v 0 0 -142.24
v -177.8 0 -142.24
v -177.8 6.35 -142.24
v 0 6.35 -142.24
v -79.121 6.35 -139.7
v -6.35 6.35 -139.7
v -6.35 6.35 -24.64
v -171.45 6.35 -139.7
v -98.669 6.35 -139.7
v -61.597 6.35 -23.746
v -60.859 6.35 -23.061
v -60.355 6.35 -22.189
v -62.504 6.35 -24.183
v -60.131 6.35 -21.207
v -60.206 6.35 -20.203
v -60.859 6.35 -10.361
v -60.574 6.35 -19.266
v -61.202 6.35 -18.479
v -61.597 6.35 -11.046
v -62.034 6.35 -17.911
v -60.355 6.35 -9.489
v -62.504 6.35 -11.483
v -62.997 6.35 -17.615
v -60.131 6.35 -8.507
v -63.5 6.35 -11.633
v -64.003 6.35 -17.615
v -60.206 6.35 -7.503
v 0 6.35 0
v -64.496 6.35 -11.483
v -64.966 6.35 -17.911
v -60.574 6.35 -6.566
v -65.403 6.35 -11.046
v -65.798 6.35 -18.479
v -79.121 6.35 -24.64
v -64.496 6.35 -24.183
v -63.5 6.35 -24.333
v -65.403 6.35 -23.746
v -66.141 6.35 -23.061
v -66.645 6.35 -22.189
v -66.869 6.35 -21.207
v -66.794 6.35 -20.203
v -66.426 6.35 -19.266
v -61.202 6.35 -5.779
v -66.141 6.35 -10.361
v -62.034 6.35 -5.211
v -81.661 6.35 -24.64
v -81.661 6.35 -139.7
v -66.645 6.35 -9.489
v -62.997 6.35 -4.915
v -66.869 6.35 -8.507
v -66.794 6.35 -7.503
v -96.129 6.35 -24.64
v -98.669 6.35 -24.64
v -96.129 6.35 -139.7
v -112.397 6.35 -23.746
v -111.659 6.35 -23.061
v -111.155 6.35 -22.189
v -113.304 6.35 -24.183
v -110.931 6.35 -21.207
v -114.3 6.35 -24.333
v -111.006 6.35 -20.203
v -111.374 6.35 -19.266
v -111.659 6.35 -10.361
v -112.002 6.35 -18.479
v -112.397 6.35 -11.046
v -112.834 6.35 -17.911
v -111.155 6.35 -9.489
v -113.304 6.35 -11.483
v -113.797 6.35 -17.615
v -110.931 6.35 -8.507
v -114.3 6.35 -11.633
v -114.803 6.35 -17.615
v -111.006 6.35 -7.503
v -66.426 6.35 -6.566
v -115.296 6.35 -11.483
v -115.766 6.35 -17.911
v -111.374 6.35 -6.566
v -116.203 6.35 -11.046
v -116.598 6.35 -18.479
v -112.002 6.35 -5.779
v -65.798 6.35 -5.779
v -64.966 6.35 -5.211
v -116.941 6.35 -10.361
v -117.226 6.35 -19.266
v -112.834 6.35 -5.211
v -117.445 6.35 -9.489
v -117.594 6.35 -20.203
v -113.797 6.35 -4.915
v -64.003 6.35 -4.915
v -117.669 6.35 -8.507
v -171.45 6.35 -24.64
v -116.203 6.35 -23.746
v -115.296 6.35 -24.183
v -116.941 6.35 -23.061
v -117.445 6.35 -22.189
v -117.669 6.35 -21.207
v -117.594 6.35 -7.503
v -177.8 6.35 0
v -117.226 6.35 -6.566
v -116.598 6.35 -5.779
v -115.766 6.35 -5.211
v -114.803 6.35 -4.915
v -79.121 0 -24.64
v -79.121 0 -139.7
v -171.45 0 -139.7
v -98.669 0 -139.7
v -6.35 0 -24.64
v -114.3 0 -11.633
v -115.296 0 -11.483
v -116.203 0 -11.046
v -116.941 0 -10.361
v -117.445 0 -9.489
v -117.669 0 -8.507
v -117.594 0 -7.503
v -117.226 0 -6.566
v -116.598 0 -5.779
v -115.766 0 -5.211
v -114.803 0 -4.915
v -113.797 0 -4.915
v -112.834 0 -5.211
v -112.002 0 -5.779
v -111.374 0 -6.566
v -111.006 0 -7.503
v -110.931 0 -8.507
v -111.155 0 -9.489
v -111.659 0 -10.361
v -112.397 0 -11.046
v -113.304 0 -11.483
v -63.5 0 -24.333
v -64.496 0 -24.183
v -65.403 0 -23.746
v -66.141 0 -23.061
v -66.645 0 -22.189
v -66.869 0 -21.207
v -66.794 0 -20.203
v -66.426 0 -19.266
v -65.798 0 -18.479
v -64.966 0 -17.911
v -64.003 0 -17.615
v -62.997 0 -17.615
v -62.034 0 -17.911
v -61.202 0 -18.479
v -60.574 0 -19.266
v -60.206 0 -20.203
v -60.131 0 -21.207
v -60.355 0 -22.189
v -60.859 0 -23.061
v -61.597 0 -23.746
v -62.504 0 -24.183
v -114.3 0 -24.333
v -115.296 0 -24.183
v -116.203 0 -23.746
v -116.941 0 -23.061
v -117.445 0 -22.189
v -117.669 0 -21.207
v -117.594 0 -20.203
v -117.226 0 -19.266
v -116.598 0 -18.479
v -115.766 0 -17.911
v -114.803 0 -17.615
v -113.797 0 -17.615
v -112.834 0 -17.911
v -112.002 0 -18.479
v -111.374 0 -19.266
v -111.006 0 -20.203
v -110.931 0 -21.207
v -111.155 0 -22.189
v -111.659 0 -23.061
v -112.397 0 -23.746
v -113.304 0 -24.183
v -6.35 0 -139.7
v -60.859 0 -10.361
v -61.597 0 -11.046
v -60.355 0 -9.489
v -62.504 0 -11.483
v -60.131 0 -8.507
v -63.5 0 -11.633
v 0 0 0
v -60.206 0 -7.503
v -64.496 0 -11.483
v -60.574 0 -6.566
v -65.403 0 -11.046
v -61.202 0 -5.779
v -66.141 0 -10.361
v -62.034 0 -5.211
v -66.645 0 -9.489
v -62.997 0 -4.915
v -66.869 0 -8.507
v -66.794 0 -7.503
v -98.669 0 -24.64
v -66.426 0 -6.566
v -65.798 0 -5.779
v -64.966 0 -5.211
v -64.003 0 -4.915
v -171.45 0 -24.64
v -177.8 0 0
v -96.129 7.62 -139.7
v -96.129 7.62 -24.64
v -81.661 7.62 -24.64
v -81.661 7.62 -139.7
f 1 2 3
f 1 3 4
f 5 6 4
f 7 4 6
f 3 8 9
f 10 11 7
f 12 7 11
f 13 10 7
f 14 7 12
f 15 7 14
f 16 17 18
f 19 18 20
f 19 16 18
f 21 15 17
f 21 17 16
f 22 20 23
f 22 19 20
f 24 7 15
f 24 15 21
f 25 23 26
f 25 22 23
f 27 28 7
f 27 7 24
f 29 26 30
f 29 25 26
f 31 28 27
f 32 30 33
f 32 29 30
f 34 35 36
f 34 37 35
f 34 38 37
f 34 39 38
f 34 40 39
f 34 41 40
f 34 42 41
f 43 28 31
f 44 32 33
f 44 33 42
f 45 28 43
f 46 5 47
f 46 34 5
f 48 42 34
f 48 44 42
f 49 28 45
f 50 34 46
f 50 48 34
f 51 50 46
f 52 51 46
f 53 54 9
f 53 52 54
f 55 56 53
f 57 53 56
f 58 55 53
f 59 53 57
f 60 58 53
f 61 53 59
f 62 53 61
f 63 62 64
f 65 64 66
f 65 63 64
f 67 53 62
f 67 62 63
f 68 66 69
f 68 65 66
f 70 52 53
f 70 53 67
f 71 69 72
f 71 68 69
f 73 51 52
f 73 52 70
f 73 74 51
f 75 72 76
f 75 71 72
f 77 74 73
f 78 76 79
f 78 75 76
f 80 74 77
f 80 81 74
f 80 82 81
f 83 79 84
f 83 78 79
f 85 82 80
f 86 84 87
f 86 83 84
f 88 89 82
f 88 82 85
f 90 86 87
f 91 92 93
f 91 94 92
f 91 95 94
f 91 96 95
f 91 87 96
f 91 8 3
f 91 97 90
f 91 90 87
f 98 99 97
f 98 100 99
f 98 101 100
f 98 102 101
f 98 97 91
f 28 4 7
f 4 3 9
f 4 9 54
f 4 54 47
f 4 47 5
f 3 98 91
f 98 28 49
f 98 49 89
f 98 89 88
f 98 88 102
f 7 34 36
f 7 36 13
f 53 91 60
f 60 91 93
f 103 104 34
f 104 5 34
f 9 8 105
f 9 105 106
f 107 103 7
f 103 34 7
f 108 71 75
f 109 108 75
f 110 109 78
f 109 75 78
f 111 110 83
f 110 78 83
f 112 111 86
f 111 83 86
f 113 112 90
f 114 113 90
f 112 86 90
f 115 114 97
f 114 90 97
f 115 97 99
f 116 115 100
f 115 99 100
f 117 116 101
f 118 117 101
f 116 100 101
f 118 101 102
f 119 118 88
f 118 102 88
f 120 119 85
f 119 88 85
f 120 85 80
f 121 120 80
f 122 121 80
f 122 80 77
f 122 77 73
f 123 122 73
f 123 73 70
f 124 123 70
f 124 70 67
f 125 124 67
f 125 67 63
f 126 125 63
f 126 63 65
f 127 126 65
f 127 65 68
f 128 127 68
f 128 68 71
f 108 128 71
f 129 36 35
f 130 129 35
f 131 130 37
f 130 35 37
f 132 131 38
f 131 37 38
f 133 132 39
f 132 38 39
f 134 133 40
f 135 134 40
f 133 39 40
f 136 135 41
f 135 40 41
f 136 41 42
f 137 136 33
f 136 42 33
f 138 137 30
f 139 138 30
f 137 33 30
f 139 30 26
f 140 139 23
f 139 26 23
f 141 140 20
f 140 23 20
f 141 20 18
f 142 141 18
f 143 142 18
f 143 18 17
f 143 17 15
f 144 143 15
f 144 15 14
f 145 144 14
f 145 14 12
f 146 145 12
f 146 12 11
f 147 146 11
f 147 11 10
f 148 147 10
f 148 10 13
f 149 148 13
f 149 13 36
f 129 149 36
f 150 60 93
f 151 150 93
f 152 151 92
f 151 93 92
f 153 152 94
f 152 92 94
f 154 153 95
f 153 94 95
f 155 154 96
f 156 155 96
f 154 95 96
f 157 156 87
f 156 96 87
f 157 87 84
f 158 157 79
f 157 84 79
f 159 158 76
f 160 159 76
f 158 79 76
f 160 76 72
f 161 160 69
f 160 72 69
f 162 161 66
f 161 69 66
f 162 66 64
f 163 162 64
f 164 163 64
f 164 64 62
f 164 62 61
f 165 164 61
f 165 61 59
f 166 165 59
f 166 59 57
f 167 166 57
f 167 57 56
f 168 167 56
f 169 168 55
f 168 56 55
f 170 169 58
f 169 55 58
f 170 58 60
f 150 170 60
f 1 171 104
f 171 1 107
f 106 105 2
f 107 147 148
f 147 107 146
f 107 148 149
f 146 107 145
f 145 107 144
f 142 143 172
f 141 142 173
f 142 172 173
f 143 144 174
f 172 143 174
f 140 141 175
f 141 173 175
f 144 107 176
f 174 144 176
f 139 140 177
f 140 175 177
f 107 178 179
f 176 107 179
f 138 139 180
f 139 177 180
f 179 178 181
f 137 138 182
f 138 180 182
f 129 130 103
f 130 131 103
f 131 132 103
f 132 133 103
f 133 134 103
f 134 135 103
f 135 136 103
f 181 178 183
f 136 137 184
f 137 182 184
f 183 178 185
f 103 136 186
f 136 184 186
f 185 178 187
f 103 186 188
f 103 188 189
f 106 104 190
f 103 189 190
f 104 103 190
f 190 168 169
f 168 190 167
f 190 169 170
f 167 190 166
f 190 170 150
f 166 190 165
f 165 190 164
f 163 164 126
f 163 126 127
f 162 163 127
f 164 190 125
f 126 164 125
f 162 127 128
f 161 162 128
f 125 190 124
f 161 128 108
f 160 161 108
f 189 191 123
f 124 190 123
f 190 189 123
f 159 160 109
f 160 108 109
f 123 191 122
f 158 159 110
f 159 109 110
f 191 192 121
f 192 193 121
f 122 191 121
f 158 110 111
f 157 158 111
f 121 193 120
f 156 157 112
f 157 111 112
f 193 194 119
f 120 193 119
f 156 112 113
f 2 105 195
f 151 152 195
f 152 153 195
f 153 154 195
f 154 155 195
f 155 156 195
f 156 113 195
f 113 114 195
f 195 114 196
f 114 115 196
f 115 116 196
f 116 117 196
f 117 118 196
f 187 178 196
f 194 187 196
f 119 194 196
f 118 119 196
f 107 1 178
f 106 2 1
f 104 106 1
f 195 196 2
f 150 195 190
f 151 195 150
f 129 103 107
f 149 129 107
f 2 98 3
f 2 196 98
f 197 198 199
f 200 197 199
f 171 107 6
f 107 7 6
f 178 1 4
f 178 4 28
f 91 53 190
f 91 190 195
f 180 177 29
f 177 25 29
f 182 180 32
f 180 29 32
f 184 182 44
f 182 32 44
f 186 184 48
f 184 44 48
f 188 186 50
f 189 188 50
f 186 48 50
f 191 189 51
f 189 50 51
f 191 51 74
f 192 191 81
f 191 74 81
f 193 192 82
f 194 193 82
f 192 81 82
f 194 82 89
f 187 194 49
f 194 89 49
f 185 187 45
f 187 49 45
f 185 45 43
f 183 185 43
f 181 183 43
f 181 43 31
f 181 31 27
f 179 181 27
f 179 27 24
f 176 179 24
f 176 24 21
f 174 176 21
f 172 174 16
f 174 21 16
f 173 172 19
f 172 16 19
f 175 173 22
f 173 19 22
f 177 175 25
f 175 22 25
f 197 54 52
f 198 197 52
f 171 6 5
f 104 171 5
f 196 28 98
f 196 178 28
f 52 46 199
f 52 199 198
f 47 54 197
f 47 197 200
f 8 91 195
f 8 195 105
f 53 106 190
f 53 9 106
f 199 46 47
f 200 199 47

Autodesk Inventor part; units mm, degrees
ref_plane "YZ Plane" through (0, 0, 0) normal (1, 0, 0) x (0, 1, 0)
ref_plane "XZ Plane" through (0, 0, 0) normal (0, 1, 0) x (-1, 0, 0)
ref_plane "XY Plane" through (0, 0, 0) normal (0, 0, 1) x (1, 0, 0)
sketch "Sketch1" plane through (0, 0, 0) normal (0, 1, 0) x (-1, 0, 0)
  line L0 (0, 0) -> (177.8, 0)
  line L1 (177.8, 0) -> (177.8, -142.24)
  line L2 (177.8, -142.24) -> (0, -142.24)
  line L3 (0, -142.24) -> (0, 0)
  line L4 (177.8, 0) -> (88.9, 0)
  line L5 (88.9, 0) -> (114.3, 0)
  line L6 (114.3, 0) -> (63.5, 0)
  line L7 (63.5, 0) -> (63.5, -8.255)
  line L8 (63.5, -8.255) -> (63.5, -20.955)
  line L9 (63.5, -20.955) -> (114.3, -20.955)
  line L10 (114.3, -20.955) -> (114.3, -8.255)
  point P0 (116.227, -12.0777)
  dimension "d0" = 177.8
  dimension "d1" = 142.24
  dimension "d2" = 25.4
  dimension "d3" = 50.8
  dimension "d4" = 8.255
  dimension "d5" = 12.7
  dimension "d6" = 50.8
extrude "Extrusion1" add sketch "Sketch1" along normal blind 6.35
hole "Hole1" at (-63.5, 0, -8.255) at (-63.5, 0, -20.955) at (-114.3, 0, -20.955) at (-114.3, 0, -8.255) direction (0, 1, 0) diameter 6.7564 end through all clearance for "Socket Head Cap Screw" size "1/4" standard "Ansi Unified Screw Threads"
sketch "Sketch2" plane through (0, 6.35, 0) normal (0, 1, 0) x (1, 0, 0)
  line L0 (-177.8, 142.24) -> (-177.8, 0) projected
  line L1 (-177.8, 142.24) -> (-171.45, 142.24)
  line L2 (-171.45, 142.24) -> (-171.45, 139.7)
  line L3 (-171.45, 139.7) -> (-177.8, 139.7)
  line L4 (-177.8, 139.7) -> (-177.8, 142.24)
  line L5 (-171.45, 139.7) -> (-98.6688, 139.7)
  line L6 (-98.6688, 139.7) -> (-98.6688, 24.6405)
  line L7 (-98.6688, 24.6405) -> (-171.45, 24.6405)
  line L8 (-171.45, 24.6405) -> (-171.45, 139.7)
  line L9 (0, 142.24) -> (-177.8, 142.24) projected
  line L10 (0, 142.24) -> (-6.35, 142.24)
  line L11 (-6.35, 142.24) -> (-6.35, 139.7)
  line L12 (-6.35, 139.7) -> (0, 139.7)
  line L13 (0, 139.7) -> (0, 142.24)
  line L14 (-6.35, 139.7) -> (-79.121, 139.7)
  line L15 (-79.121, 139.7) -> (-79.121, 24.6405)
  line L16 (-79.121, 24.6405) -> (-6.35, 24.6405)
  line L17 (-6.35, 24.6405) -> (-6.35, 139.7)
  point P0 (0, 0)
  dimension "d16" = 6.35
  dimension "d17" = 2.54
  dimension "d18" = 72.7812
  dimension "d19" = 115.0595
  dimension "d20" = 6.35
  dimension "d21" = 72.771
  dimension "d22" = 115.0595
extrude "Extrusion2" cut sketch "Sketch2" against normal blind 6.35 contours L17 L16 L15 L14 | L5 L6 L7 L8
sketch "Sketch3" plane through (0, 6.35, 0) normal (0, 1, 0) x (1, 0, 0)
  line L0 (-98.6688, 139.7) -> (-171.45, 139.7) projected
  line L1 (-98.6688, 139.7) -> (-96.1288, 139.7)
  line L2 (-96.1288, 139.7) -> (-96.1288, 24.6405)
  line L3 (-96.1288, 24.6405) -> (-98.6688, 24.6405)
  line L4 (-98.6688, 24.6405) -> (-98.6688, 139.7)
  line L5 (-79.121, 24.6405) -> (-79.121, 139.7) projected
  line L6 (-79.121, 24.6405) -> (-81.661, 24.6405)
  line L7 (-81.661, 24.6405) -> (-81.661, 139.7)
  line L8 (-81.661, 139.7) -> (-79.121, 139.7)
  line L9 (-79.121, 139.7) -> (-79.121, 24.6405)
  line L10 (-96.1288, 139.7) -> (-93.5888, 139.7)
  line L11 (-93.5888, 139.7) -> (-93.5888, 24.6405)
  line L12 (-93.5888, 24.6405) -> (-96.1288, 24.6405)
  line L13 (-96.1288, 24.6405) -> (-96.1288, 139.7)
  line L14 (-81.661, 24.6405) -> (-84.201, 24.6405)
  line L15 (-84.201, 24.6405) -> (-84.201, 139.7)
  line L16 (-84.201, 139.7) -> (-81.661, 139.7)
  line L17 (-81.661, 139.7) -> (-81.661, 24.6405)
  line L18 (-93.5888, 139.7) -> (-84.201, 139.7)
  line L19 (-84.201, 139.7) -> (-84.201, 24.6405)
  line L20 (-84.201, 24.6405) -> (-93.5888, 24.6405)
  line L21 (-93.5888, 24.6405) -> (-93.5888, 139.7)
  point P0 (0, 0)
  dimension "d26" = 2.54
  dimension "d27" = 2.54
  dimension "d30" = 2.54
  dimension "d31" = 2.54
extrude "Extrusion4" add sketch "Sketch3" along normal blind 1.27 contours L10 L11 L12 L2 | L18 L15 L20 L11 | L16 L7 L14 L15
properties part number "USAXS double well plate"
